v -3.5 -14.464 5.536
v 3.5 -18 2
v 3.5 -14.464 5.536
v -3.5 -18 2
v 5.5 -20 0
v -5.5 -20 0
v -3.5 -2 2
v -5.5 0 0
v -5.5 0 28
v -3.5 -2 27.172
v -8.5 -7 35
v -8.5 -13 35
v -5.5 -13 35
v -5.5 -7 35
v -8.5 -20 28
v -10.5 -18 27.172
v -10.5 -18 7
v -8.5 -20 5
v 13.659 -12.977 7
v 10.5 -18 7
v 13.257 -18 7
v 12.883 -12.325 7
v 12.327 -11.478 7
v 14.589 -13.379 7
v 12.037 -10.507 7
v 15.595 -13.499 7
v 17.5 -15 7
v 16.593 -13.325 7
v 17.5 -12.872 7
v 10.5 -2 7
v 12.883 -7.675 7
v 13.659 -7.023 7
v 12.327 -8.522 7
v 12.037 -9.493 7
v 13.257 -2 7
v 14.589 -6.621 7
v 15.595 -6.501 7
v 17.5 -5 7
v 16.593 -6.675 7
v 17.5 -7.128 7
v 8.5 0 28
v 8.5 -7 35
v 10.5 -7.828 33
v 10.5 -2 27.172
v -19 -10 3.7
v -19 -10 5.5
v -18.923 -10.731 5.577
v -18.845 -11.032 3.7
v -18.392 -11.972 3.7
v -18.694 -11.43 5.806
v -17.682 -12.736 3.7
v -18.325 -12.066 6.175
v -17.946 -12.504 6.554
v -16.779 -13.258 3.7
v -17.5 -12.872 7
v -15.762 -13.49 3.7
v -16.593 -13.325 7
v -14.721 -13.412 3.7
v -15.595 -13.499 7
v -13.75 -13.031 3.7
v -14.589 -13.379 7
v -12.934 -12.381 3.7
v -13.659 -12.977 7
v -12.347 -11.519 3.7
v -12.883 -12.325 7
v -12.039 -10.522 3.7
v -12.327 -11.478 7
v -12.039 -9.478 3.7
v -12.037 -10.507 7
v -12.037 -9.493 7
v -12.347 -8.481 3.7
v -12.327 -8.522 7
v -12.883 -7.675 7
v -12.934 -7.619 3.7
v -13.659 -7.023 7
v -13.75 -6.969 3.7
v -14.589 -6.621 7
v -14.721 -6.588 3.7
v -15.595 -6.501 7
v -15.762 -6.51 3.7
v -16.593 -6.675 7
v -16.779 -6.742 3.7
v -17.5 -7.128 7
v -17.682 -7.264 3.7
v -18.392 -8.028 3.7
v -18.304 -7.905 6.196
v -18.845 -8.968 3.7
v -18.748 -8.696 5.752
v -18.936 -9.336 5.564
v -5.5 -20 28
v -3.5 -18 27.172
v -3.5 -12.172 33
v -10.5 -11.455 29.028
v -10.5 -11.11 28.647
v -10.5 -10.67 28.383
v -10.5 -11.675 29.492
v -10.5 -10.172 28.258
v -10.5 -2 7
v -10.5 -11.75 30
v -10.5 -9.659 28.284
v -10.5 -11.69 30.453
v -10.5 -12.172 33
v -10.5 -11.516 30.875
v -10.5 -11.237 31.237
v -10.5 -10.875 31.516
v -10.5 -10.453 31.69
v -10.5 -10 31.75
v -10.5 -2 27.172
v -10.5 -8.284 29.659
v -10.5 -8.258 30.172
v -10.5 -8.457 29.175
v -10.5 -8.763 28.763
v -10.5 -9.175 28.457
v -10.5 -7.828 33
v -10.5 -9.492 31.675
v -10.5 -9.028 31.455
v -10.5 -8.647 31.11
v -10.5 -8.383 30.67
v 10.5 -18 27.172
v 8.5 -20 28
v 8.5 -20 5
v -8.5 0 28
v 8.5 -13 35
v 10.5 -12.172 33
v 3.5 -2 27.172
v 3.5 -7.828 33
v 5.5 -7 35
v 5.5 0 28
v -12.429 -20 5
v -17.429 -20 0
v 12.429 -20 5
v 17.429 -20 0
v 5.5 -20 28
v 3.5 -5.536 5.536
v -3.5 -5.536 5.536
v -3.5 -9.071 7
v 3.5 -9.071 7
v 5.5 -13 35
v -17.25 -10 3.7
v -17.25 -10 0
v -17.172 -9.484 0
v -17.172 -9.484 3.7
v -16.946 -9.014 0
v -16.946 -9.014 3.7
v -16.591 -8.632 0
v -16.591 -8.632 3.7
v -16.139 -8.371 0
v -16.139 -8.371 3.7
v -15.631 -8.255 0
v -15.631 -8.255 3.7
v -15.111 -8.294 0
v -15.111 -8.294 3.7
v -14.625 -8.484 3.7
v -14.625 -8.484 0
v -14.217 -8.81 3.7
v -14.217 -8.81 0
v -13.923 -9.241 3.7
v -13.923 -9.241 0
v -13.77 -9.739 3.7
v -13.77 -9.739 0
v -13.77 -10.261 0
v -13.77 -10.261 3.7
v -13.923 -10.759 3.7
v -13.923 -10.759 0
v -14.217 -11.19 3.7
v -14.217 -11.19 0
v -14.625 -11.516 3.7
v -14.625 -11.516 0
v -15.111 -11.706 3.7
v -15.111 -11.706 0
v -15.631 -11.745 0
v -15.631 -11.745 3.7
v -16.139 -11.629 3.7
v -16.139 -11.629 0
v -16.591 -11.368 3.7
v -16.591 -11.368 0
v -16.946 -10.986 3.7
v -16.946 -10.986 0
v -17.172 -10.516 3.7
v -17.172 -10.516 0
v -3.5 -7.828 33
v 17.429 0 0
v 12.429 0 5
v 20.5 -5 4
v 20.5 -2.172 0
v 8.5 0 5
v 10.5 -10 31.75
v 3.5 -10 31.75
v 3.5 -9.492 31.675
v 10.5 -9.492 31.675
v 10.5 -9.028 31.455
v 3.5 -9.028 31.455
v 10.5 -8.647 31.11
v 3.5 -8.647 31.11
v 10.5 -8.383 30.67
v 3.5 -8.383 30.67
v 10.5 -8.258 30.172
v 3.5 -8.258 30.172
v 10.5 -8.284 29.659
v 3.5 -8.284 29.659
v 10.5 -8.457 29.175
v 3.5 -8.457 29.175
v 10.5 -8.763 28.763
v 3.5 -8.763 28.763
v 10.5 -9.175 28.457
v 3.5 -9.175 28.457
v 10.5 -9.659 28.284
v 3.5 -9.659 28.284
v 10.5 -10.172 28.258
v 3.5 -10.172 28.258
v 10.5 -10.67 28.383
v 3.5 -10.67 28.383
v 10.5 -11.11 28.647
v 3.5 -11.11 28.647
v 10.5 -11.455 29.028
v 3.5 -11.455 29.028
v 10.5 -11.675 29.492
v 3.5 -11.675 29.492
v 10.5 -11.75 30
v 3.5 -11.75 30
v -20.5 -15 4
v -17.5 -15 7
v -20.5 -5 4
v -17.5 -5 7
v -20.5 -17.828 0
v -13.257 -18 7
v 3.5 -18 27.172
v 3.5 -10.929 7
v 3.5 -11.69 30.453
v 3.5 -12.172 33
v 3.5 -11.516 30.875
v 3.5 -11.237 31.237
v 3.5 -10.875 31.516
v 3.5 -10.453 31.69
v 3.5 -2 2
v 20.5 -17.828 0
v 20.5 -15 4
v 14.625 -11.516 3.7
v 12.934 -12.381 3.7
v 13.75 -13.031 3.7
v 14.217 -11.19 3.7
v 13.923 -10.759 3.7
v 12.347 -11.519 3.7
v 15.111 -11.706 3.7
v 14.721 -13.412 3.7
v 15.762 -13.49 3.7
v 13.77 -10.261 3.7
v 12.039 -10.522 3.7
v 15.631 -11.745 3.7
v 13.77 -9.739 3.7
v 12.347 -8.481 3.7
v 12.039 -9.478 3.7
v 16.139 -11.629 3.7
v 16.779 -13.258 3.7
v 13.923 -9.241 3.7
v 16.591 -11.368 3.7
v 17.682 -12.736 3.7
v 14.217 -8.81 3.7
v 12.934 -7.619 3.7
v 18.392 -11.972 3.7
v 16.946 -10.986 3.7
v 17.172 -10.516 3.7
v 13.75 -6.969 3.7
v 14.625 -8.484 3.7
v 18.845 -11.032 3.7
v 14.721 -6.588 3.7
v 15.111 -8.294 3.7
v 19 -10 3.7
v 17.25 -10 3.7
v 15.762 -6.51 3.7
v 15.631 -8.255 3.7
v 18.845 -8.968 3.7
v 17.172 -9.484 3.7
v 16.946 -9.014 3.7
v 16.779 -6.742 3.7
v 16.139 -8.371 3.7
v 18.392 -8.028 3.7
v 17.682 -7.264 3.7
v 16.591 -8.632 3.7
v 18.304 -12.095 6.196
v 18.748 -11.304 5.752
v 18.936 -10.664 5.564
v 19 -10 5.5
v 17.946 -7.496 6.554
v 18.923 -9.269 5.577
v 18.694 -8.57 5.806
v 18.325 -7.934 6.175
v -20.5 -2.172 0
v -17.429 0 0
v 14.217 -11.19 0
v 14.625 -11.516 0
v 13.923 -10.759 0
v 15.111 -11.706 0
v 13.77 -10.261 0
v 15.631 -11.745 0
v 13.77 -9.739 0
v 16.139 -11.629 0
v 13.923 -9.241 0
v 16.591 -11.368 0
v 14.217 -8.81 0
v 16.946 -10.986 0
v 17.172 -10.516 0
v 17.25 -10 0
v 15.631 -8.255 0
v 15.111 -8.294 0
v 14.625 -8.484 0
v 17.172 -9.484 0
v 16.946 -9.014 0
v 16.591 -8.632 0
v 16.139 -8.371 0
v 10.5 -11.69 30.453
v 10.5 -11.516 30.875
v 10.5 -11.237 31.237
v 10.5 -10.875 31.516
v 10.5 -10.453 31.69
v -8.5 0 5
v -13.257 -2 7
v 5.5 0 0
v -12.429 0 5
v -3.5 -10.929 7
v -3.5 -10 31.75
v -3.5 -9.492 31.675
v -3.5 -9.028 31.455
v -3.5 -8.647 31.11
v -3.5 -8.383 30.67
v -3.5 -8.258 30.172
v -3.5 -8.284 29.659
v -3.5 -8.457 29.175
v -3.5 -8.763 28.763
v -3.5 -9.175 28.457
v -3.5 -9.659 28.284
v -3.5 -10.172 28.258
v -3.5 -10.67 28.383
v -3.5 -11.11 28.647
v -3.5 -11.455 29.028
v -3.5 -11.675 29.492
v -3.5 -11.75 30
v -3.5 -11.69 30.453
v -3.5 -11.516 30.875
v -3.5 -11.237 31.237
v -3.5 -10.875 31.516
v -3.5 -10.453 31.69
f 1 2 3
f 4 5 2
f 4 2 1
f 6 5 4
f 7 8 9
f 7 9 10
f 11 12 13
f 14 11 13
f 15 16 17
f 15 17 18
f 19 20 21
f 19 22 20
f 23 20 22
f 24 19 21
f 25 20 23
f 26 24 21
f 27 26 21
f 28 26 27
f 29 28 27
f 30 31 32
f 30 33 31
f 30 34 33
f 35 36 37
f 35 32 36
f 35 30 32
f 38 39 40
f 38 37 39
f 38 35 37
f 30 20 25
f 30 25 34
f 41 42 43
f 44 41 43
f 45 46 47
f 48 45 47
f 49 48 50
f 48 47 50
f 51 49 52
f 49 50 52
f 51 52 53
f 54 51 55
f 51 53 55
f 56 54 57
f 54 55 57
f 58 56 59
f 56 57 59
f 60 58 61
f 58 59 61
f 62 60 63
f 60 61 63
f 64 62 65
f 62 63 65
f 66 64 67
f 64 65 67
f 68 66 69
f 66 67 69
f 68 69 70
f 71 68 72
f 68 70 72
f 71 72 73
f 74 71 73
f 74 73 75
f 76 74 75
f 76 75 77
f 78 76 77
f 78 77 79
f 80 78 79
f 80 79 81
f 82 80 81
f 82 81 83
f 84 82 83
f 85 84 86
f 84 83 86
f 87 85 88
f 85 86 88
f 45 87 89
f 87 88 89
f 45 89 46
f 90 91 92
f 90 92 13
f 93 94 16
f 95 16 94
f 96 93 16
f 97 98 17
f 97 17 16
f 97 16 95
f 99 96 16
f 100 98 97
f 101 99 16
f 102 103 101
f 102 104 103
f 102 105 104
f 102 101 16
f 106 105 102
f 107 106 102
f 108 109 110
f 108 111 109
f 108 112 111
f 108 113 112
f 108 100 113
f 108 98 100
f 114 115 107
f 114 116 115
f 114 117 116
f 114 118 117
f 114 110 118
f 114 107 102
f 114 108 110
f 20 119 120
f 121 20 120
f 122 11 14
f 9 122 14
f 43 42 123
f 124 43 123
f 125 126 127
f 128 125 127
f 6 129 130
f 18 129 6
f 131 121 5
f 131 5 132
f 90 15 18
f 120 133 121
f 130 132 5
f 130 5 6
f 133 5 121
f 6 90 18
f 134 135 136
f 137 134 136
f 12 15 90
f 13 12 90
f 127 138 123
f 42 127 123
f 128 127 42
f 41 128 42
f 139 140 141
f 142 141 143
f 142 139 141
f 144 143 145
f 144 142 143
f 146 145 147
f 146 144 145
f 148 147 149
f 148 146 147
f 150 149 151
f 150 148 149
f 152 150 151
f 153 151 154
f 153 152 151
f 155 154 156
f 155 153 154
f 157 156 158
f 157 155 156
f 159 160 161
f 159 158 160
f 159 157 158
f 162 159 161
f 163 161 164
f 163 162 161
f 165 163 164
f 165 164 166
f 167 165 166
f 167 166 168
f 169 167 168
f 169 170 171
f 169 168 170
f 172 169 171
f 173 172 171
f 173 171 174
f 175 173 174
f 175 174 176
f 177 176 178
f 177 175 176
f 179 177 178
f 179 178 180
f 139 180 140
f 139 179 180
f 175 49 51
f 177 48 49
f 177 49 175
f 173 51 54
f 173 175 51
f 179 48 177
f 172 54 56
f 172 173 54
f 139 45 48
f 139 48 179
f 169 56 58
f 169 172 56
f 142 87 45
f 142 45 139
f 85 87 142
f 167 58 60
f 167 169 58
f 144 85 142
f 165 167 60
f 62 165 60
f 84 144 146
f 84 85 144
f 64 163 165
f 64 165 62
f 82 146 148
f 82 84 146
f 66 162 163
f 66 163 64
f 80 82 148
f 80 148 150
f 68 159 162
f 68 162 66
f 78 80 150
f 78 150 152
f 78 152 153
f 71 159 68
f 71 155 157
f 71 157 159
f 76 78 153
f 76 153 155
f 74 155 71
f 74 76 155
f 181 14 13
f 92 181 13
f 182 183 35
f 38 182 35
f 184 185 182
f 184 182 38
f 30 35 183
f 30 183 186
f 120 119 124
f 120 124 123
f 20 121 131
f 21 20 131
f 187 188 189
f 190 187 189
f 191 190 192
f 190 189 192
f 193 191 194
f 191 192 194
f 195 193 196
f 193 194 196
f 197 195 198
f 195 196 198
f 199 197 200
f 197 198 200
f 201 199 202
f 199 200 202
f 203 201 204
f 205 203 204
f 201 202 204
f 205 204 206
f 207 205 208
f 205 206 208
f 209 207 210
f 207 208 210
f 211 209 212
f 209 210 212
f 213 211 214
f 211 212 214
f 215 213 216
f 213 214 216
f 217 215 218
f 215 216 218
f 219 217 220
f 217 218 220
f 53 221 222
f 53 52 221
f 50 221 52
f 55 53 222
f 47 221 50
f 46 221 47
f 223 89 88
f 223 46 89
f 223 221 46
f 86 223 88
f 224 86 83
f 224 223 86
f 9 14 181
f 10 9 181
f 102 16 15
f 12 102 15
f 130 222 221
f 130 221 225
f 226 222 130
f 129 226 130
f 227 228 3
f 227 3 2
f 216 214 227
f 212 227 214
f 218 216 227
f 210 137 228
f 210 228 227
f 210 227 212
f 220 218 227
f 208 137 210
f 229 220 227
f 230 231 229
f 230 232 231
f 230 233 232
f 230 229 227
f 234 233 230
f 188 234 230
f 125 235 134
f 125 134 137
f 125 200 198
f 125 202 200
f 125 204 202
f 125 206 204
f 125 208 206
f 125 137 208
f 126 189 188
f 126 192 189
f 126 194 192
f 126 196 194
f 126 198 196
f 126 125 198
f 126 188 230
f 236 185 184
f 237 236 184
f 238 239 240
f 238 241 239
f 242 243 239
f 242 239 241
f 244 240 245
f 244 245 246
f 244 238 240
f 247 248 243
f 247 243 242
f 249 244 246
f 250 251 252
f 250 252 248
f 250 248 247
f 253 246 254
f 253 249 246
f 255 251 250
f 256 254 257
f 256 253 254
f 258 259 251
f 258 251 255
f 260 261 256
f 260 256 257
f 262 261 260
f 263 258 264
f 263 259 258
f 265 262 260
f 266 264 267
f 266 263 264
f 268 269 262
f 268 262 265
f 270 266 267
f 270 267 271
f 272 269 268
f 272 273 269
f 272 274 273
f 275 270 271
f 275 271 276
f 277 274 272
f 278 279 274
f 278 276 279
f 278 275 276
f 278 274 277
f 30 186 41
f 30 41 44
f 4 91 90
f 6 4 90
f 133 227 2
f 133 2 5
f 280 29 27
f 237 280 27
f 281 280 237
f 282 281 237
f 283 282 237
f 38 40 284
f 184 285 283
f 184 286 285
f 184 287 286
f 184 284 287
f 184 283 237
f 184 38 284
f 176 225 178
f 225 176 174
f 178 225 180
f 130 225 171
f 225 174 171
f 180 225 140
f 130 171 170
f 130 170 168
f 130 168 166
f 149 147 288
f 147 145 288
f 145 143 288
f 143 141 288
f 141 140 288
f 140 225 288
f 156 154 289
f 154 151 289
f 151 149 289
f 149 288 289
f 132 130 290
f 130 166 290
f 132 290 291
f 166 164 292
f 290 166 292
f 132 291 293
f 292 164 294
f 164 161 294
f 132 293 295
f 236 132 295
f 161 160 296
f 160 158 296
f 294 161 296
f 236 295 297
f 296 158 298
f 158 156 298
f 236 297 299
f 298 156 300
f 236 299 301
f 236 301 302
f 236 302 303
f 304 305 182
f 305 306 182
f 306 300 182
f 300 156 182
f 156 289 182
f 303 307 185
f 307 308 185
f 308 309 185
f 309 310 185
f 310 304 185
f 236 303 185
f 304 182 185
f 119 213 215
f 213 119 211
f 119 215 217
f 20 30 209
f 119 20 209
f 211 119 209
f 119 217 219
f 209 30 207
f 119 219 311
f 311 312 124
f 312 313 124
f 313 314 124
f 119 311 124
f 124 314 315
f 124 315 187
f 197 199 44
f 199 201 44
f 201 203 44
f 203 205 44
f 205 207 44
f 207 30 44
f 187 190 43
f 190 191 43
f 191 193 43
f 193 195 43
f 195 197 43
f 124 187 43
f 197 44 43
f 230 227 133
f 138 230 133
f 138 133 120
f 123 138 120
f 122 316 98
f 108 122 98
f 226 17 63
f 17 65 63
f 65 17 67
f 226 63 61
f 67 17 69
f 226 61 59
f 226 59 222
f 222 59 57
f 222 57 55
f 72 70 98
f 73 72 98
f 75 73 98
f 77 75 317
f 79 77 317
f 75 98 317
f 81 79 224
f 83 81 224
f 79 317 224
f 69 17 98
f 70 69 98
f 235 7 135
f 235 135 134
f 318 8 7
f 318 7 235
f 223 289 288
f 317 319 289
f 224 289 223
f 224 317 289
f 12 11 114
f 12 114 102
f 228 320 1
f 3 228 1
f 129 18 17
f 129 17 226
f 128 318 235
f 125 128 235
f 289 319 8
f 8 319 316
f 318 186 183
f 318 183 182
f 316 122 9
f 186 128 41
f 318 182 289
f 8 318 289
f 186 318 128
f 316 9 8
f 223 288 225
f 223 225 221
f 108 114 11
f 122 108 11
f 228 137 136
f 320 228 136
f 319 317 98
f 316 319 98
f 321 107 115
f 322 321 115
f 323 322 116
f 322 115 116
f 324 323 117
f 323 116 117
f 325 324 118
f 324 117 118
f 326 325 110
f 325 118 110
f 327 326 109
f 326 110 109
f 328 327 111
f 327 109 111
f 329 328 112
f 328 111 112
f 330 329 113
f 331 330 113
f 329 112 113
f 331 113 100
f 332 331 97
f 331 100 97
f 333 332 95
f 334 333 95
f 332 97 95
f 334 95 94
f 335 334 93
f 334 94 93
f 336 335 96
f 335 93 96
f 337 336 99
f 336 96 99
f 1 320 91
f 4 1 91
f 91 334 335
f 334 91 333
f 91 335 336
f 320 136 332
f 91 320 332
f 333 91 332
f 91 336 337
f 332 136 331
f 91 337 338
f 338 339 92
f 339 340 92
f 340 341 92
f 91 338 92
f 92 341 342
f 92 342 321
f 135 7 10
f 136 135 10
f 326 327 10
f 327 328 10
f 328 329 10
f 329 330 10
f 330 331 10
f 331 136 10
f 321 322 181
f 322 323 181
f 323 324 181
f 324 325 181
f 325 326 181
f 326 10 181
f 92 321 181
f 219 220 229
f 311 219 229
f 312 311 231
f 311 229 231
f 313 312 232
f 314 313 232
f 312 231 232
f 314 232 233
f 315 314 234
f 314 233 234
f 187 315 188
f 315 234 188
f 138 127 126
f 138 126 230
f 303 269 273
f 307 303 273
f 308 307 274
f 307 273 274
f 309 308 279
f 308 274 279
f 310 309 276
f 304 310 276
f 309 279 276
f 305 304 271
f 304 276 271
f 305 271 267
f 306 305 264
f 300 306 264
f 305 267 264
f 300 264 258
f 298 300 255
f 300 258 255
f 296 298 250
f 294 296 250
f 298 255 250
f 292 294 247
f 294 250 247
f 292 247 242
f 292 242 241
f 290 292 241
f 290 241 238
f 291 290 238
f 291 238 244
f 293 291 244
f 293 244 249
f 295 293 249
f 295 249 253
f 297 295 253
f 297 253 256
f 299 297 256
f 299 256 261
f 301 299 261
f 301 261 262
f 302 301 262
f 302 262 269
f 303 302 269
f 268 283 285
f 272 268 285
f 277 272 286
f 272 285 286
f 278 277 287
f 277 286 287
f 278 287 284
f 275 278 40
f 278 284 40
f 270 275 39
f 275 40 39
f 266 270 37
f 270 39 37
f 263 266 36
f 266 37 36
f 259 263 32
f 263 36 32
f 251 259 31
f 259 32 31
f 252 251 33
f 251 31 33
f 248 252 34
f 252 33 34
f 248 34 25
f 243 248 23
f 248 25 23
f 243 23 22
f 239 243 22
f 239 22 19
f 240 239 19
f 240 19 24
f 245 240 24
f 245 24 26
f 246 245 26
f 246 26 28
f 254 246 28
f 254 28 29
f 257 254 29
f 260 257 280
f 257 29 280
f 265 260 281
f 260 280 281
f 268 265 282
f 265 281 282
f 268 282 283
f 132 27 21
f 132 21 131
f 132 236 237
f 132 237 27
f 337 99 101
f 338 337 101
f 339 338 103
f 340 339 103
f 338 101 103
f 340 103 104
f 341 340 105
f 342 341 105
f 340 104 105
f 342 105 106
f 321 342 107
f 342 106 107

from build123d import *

# Parameters (mm, degrees)
F0_W          = 10
F0_H          = 7
F0_W_2        = 7
F0_H_2        = 28
F1_DEPTH      = 20
F2_R          = 3.5
F2_R_2        = 1.75
F3_DEPTH      = 3.3
F4_DEPTH      = 25
F6_DEPTH      = 3.3
F7_DEPTH      = 25
F9_DEPTH      = 25
F10_SIZE      = 7
F11_T1_DEPTH  = 35.4300979278
F12_SIZE      = 6.99999
F13_T1_DEPTH  = 7
F13_T6_DEPTH  = 29.9594705668
F13_T11_DEPTH = 29.9594705668
F13_T16_DEPTH = 29.9594705668
F13_T21_DEPTH = 29.9594705668
F14_T1_DEPTH  = 26.1433659759
F14_T3_DEPTH  = 20.1862268885
F14_T5_DEPTH  = 20.1862268885
F14_T10_DEPTH = 38.2867219519
F14_T15_DEPTH = 38.2867219519
F14_T20_DEPTH = 38.2867219519
F14_T25_DEPTH = 38.2867219519
F15_SIZE      = 2
F16_SIZE      = 2


# Not quite as in the source:
# - a fillet or chamfer that OpenCascade refuses, or shapes differently, is made with other operations: its cross-section is extruded or revolved along the edge and cut away or added
# - a fillet or chamfer is up to 0.001 mm smaller than in the source, because OpenCascade refuses the exact size


with BuildPart() as f1:
    # F0 (on Front) → F1 (new body)
    with BuildSketch(Plane.XZ):
        with Locations((-15.5, 3.5)):
            Rectangle(F0_W, F0_H)
        with Locations((-7, 3.5)):
            Rectangle(F0_W_2, F0_H)
        with Locations((0, 3.5)):
            Rectangle(F0_W_2, F0_H)
        with Locations((-7, 21)):
            Rectangle(F0_W_2, F0_H_2)
        with Locations((7, 3.5)):
            Rectangle(F0_W_2, F0_H)
        with Locations((15.5, 3.5)):
            Rectangle(F0_W, F0_H)
        with Locations((7, 21)):
            Rectangle(F0_W_2, F0_H_2)
    extrude(amount=F1_DEPTH)

    # F2 (on face) → F3 (cut)
    with BuildSketch(Plane.XY.offset(7)):
        with Locations((15.5, -10)):
            Circle(F2_R)
        with Locations((15.5, -10)):
            Circle(F2_R_2, mode=Mode.SUBTRACT)
    extrude(amount=-F3_DEPTH, mode=Mode.SUBTRACT)

    # F2 (on face) → F4 (cut)
    with BuildSketch(Plane.XY.offset(7)):
        with Locations((15.5, -10)):
            Circle(F2_R_2)
    extrude(amount=-F4_DEPTH, mode=Mode.SUBTRACT)

    # F5 (on face) → F6 (cut)
    with BuildSketch(Plane.XY.offset(7)):
        with BuildLine():
            ThreePointArc((-12, -10), (-15.5, -6.5), (-19, -10))
            ThreePointArc((-19, -10), (-15.5, -13.5), (-12, -10))
        make_face()
        with BuildLine():
            ThreePointArc((-13.75, -10), (-15.5, -11.75), (-17.25, -10))
            ThreePointArc((-17.25, -10), (-15.5, -8.25), (-13.75, -10))
        make_face(mode=Mode.SUBTRACT)
    extrude(amount=-F6_DEPTH, mode=Mode.SUBTRACT)

    # F7 (cut): a face of the model
    f7_faces = [f1.faces().sort_by_distance(p)[0] for p in [
        (-15.5, -10, 7),
    ]]
    extrude(f7_faces, amount=-F7_DEPTH, mode=Mode.SUBTRACT)

    # F8 (on face) → F9 (cut)
    with BuildSketch(Plane(origin=(-10.5, 0, 0), x_dir=(0, -1, 0), z_dir=(-1, 0, 0))):
        with BuildLine():
            ThreePointArc((10, 31.75), (8.7625631329, 28.7625631329), (11.75, 30))
            ThreePointArc((11.75, 30), (11.2374368671, 31.2374368671), (10, 31.75))
        make_face()
    extrude(amount=-F9_DEPTH, mode=Mode.SUBTRACT)

    # F10
    f10_edges = [f1.edges().sort_by_distance(p)[0] for p in [
        (-7, -20, 35),
        (-7, 0, 35),
        (7, 0, 35),
        (7, -20, 35),
    ]]
    chamfer(f10_edges, length=F10_SIZE)

    # F11: chamfer of 3 on 2 edges, made by hand

    # F11_s2 → F11_t1 (cut)
    with BuildSketch(Plane.XZ.offset(-7.7150489639)):
        Polygon((17.5, 7), (20.5, 4), (20.5, 7), align=None)
        Polygon((-20.5, 4), (-17.5, 7), (-20.5, 7), align=None)
    extrude(amount=F11_T1_DEPTH, mode=Mode.SUBTRACT)

    # F12 (size 7 in the source; OpenCascade refuses exactly that, so slightly less here)
    f12_edges = [f1.edges().sort_by_distance(p)[0] for p in [
        (0, 0, 7),
        (0, -20, 7),
    ]]
    chamfer(f12_edges, length=F12_SIZE)

    # F13: chamfer of 5 on 6 edges, made by hand

    # F13_s2 → F13_t1 (cut)
    with BuildSketch(Plane.YZ.offset(-3.5)):
        Polygon((-5.5355239059, 5.5355339059), (-9.0710578119, 7), (-6.99999, 7), align=None)
        Polygon((-10.9289421881, 7), (-14.4644760941, 5.5355339059), (-13.00001, 7), align=None)
    extrude(amount=F13_T1_DEPTH, mode=Mode.SUBTRACT)


with BuildPart() as f13_tool4:
    # F13_s5 → F13_t6 (new body)
    with BuildSketch(Plane(origin=(17.3422723993, 0, -17.3422723993), x_dir=(0, 1, 0), z_dir=(-0.7071067812, 0, 0.7071067812))):
        Polygon((-15, -17.3241161391), (-20, -12.3241161391), (-20, -17.3241161391), align=None)
    extrude(amount=F13_T6_DEPTH)

    split(bisect_by=Plane.XY.offset(7), keep=Keep.BOTTOM)


with BuildPart() as f1_1:
    add(f1.part)

    # F13_t3: cut F13_tool4
    add(f13_tool4.part, mode=Mode.SUBTRACT)


with BuildPart() as f13_tool9:
    # F13_s10 → F13_t11 (new body)
    with BuildSketch(Plane(origin=(17.3422723993, 0, -17.3422723993), x_dir=(0, 1, 0), z_dir=(-0.7071067812, 0, 0.7071067812))):
        Polygon((0, -12.3241161391), (-5, -17.3241161391), (0, -17.3241161391), align=None)
    extrude(amount=F13_T11_DEPTH)

    split(bisect_by=Plane.XY.offset(7), keep=Keep.BOTTOM)


with BuildPart() as f1_2:
    add(f1_1.part)

    # F13_t8: cut F13_tool9
    add(f13_tool9.part, mode=Mode.SUBTRACT)


with BuildPart() as f13_tool14:
    # F13_s15 → F13_t16 (new body)
    with BuildSketch(Plane(origin=(3.8422723993, 0, 3.8422723993), x_dir=(0, 1, 0), z_dir=(-0.7071067812, 0, -0.7071067812))):
        Polygon((0, -12.3241161391), (-5, -17.3241161391), (0, -17.3241161391), align=None)
    extrude(amount=F13_T16_DEPTH)

    split(bisect_by=Plane.XY.offset(7), keep=Keep.BOTTOM)


with BuildPart() as f1_3:
    add(f1_2.part)

    # F13_t13: cut F13_tool14
    add(f13_tool14.part, mode=Mode.SUBTRACT)


with BuildPart() as f13_tool19:
    # F13_s20 → F13_t21 (new body)
    with BuildSketch(Plane(origin=(3.8422723993, 0, 3.8422723993), x_dir=(0, 1, 0), z_dir=(-0.7071067812, 0, -0.7071067812))):
        Polygon((-15, -17.3241161391), (-20, -12.3241161391), (-20, -17.3241161391), align=None)
    extrude(amount=F13_T21_DEPTH)

    split(bisect_by=Plane.XY.offset(7), keep=Keep.BOTTOM)


with BuildPart() as f1_4:
    add(f1_3.part)

    # F13_t18: cut F13_tool19
    add(f13_tool19.part, mode=Mode.SUBTRACT)

    # F14: chamfer of 2 on 16 edges, made by hand

    # F14_s2 → F14_t1 (cut)
    with BuildSketch(Plane.XY.offset(7)):
        Polygon((-10.5, -18), (-8.5, -20), (-10.5, -20), align=None)
        Polygon((10.5, -18), (8.5, -20), (10.5, -20), align=None)
        Polygon((8.5, 0), (10.5, -2), (10.5, 0), align=None)
        Polygon((-8.5, 0), (-10.5, -2), (-10.5, 0), align=None)
    extrude(amount=F14_T1_DEPTH, mode=Mode.SUBTRACT)

    # F14_s4 → F14_t3 (cut)
    with BuildSketch(Plane(origin=(0, 0.3630910403, 0.3630910403), x_dir=(1, 0, 0), z_dir=(0, 0.7071067812, 0.7071067812))):
        Polygon((10.5, -31.941125497), (8.5, -33.941125497), (10.5, -33.941125497), align=None)
        Polygon((3.5, -31.941125497), (5.5, -33.941125497), (3.5, -33.941125497), align=None)
        Polygon((-10.5, -31.941125497), (-8.5, -33.941125497), (-10.5, -33.941125497), align=None)
        Polygon((-3.5, -31.941125497), (-5.5, -33.941125497), (-3.5, -33.941125497), align=None)
    extrude(amount=F14_T3_DEPTH, mode=Mode.SUBTRACT)

    # F14_s6 → F14_t5 (cut)
    with BuildSketch(Plane(origin=(0, -10.3630910403, 10.3630910403), x_dir=(1, 0, 0), z_dir=(0, -0.7071067812, 0.7071067812))):
        Polygon((3.5, 17.7989898732), (5.5, 19.7989898732), (3.5, 19.7989898732), align=None)
        Polygon((8.5, 19.7989898732), (10.5, 17.7989898732), (10.5, 19.7989898732), align=None)
        Polygon((-5.5, 19.7989898732), (-3.5, 17.7989898732), (-3.5, 19.7989898732), align=None)
        Polygon((-10.5, 17.7989898732), (-8.5, 19.7989898732), (-10.5, 19.7989898732), align=None)
    extrude(amount=F14_T5_DEPTH, mode=Mode.SUBTRACT)


with BuildPart() as f14_tool8:
    # F14_s9 → F14_t10 (new body)
    with BuildSketch(Plane.XY.offset(33.1433659759)):
        Polygon((-3.5, -18), (-5.5, -20), (-3.5, -20), align=None)
    extrude(amount=-F14_T10_DEPTH)

    split(bisect_by=Plane(origin=(0, -10.000005, 10.000005), x_dir=(1, 0, 0), z_dir=(0, -0.7071067812, 0.7071067812)), keep=Keep.TOP)


with BuildPart() as f1_5:
    add(f1_4.part)

    # F14_t7: cut F14_tool8
    add(f14_tool8.part, mode=Mode.SUBTRACT)


with BuildPart() as f14_tool13:
    # F14_s14 → F14_t15 (new body)
    with BuildSketch(Plane.XY.offset(-5.1433559759)):
        Polygon((3.5, -18), (5.5, -20), (3.5, -20), align=None)
    extrude(amount=F14_T15_DEPTH)

    split(bisect_by=Plane(origin=(0, -10.000005, 10.000005), x_dir=(1, 0, 0), z_dir=(0, -0.7071067812, 0.7071067812)), keep=Keep.TOP)


with BuildPart() as f1_6:
    add(f1_5.part)

    # F14_t12: cut F14_tool13
    add(f14_tool13.part, mode=Mode.SUBTRACT)


with BuildPart() as f14_tool18:
    # F14_s19 → F14_t20 (new body)
    with BuildSketch(Plane.XY.offset(-5.1433559759)):
        Polygon((5.5, 0), (3.5, -2), (3.5, 0), align=None)
    extrude(amount=F14_T20_DEPTH)

    split(bisect_by=Plane(origin=(0, 5e-06, 5e-06), x_dir=(1, 0, 0), z_dir=(0, 0.7071067812, 0.7071067812)), keep=Keep.TOP)


with BuildPart() as f1_7:
    add(f1_6.part)

    # F14_t17: cut F14_tool18
    add(f14_tool18.part, mode=Mode.SUBTRACT)


with BuildPart() as f14_tool23:
    # F14_s24 → F14_t25 (new body)
    with BuildSketch(Plane.XY.offset(33.1433659759)):
        Polygon((-5.5, 0), (-3.5, -2), (-3.5, 0), align=None)
    extrude(amount=-F14_T25_DEPTH)

    split(bisect_by=Plane(origin=(0, 5e-06, 5e-06), x_dir=(1, 0, 0), z_dir=(0, 0.7071067812, 0.7071067812)), keep=Keep.TOP)


with BuildPart() as f1_8:
    add(f1_7.part)

    # F14_t22: cut F14_tool23
    add(f14_tool23.part, mode=Mode.SUBTRACT)

    # F15
    f15_edges = [f1_8.edges().sort_by_distance(p)[0] for p in [
        (10.5, -10, 35),
        (3.5, -10, 35),
        (-3.5, -10, 35),
        (-10.5, -10, 35),
    ]]
    chamfer(f15_edges, length=F15_SIZE)

    # F16
    f16_edges = [f1_8.edges().sort_by_distance(p)[0] for p in [
        (-9.464466, 0, 7),
        (9.464466, 0, 7),
        (-9.464466, -20, 7),
        (9.464466, -20, 7),
    ]]
    chamfer(f16_edges, length=F16_SIZE)


solid = f1_8.part
